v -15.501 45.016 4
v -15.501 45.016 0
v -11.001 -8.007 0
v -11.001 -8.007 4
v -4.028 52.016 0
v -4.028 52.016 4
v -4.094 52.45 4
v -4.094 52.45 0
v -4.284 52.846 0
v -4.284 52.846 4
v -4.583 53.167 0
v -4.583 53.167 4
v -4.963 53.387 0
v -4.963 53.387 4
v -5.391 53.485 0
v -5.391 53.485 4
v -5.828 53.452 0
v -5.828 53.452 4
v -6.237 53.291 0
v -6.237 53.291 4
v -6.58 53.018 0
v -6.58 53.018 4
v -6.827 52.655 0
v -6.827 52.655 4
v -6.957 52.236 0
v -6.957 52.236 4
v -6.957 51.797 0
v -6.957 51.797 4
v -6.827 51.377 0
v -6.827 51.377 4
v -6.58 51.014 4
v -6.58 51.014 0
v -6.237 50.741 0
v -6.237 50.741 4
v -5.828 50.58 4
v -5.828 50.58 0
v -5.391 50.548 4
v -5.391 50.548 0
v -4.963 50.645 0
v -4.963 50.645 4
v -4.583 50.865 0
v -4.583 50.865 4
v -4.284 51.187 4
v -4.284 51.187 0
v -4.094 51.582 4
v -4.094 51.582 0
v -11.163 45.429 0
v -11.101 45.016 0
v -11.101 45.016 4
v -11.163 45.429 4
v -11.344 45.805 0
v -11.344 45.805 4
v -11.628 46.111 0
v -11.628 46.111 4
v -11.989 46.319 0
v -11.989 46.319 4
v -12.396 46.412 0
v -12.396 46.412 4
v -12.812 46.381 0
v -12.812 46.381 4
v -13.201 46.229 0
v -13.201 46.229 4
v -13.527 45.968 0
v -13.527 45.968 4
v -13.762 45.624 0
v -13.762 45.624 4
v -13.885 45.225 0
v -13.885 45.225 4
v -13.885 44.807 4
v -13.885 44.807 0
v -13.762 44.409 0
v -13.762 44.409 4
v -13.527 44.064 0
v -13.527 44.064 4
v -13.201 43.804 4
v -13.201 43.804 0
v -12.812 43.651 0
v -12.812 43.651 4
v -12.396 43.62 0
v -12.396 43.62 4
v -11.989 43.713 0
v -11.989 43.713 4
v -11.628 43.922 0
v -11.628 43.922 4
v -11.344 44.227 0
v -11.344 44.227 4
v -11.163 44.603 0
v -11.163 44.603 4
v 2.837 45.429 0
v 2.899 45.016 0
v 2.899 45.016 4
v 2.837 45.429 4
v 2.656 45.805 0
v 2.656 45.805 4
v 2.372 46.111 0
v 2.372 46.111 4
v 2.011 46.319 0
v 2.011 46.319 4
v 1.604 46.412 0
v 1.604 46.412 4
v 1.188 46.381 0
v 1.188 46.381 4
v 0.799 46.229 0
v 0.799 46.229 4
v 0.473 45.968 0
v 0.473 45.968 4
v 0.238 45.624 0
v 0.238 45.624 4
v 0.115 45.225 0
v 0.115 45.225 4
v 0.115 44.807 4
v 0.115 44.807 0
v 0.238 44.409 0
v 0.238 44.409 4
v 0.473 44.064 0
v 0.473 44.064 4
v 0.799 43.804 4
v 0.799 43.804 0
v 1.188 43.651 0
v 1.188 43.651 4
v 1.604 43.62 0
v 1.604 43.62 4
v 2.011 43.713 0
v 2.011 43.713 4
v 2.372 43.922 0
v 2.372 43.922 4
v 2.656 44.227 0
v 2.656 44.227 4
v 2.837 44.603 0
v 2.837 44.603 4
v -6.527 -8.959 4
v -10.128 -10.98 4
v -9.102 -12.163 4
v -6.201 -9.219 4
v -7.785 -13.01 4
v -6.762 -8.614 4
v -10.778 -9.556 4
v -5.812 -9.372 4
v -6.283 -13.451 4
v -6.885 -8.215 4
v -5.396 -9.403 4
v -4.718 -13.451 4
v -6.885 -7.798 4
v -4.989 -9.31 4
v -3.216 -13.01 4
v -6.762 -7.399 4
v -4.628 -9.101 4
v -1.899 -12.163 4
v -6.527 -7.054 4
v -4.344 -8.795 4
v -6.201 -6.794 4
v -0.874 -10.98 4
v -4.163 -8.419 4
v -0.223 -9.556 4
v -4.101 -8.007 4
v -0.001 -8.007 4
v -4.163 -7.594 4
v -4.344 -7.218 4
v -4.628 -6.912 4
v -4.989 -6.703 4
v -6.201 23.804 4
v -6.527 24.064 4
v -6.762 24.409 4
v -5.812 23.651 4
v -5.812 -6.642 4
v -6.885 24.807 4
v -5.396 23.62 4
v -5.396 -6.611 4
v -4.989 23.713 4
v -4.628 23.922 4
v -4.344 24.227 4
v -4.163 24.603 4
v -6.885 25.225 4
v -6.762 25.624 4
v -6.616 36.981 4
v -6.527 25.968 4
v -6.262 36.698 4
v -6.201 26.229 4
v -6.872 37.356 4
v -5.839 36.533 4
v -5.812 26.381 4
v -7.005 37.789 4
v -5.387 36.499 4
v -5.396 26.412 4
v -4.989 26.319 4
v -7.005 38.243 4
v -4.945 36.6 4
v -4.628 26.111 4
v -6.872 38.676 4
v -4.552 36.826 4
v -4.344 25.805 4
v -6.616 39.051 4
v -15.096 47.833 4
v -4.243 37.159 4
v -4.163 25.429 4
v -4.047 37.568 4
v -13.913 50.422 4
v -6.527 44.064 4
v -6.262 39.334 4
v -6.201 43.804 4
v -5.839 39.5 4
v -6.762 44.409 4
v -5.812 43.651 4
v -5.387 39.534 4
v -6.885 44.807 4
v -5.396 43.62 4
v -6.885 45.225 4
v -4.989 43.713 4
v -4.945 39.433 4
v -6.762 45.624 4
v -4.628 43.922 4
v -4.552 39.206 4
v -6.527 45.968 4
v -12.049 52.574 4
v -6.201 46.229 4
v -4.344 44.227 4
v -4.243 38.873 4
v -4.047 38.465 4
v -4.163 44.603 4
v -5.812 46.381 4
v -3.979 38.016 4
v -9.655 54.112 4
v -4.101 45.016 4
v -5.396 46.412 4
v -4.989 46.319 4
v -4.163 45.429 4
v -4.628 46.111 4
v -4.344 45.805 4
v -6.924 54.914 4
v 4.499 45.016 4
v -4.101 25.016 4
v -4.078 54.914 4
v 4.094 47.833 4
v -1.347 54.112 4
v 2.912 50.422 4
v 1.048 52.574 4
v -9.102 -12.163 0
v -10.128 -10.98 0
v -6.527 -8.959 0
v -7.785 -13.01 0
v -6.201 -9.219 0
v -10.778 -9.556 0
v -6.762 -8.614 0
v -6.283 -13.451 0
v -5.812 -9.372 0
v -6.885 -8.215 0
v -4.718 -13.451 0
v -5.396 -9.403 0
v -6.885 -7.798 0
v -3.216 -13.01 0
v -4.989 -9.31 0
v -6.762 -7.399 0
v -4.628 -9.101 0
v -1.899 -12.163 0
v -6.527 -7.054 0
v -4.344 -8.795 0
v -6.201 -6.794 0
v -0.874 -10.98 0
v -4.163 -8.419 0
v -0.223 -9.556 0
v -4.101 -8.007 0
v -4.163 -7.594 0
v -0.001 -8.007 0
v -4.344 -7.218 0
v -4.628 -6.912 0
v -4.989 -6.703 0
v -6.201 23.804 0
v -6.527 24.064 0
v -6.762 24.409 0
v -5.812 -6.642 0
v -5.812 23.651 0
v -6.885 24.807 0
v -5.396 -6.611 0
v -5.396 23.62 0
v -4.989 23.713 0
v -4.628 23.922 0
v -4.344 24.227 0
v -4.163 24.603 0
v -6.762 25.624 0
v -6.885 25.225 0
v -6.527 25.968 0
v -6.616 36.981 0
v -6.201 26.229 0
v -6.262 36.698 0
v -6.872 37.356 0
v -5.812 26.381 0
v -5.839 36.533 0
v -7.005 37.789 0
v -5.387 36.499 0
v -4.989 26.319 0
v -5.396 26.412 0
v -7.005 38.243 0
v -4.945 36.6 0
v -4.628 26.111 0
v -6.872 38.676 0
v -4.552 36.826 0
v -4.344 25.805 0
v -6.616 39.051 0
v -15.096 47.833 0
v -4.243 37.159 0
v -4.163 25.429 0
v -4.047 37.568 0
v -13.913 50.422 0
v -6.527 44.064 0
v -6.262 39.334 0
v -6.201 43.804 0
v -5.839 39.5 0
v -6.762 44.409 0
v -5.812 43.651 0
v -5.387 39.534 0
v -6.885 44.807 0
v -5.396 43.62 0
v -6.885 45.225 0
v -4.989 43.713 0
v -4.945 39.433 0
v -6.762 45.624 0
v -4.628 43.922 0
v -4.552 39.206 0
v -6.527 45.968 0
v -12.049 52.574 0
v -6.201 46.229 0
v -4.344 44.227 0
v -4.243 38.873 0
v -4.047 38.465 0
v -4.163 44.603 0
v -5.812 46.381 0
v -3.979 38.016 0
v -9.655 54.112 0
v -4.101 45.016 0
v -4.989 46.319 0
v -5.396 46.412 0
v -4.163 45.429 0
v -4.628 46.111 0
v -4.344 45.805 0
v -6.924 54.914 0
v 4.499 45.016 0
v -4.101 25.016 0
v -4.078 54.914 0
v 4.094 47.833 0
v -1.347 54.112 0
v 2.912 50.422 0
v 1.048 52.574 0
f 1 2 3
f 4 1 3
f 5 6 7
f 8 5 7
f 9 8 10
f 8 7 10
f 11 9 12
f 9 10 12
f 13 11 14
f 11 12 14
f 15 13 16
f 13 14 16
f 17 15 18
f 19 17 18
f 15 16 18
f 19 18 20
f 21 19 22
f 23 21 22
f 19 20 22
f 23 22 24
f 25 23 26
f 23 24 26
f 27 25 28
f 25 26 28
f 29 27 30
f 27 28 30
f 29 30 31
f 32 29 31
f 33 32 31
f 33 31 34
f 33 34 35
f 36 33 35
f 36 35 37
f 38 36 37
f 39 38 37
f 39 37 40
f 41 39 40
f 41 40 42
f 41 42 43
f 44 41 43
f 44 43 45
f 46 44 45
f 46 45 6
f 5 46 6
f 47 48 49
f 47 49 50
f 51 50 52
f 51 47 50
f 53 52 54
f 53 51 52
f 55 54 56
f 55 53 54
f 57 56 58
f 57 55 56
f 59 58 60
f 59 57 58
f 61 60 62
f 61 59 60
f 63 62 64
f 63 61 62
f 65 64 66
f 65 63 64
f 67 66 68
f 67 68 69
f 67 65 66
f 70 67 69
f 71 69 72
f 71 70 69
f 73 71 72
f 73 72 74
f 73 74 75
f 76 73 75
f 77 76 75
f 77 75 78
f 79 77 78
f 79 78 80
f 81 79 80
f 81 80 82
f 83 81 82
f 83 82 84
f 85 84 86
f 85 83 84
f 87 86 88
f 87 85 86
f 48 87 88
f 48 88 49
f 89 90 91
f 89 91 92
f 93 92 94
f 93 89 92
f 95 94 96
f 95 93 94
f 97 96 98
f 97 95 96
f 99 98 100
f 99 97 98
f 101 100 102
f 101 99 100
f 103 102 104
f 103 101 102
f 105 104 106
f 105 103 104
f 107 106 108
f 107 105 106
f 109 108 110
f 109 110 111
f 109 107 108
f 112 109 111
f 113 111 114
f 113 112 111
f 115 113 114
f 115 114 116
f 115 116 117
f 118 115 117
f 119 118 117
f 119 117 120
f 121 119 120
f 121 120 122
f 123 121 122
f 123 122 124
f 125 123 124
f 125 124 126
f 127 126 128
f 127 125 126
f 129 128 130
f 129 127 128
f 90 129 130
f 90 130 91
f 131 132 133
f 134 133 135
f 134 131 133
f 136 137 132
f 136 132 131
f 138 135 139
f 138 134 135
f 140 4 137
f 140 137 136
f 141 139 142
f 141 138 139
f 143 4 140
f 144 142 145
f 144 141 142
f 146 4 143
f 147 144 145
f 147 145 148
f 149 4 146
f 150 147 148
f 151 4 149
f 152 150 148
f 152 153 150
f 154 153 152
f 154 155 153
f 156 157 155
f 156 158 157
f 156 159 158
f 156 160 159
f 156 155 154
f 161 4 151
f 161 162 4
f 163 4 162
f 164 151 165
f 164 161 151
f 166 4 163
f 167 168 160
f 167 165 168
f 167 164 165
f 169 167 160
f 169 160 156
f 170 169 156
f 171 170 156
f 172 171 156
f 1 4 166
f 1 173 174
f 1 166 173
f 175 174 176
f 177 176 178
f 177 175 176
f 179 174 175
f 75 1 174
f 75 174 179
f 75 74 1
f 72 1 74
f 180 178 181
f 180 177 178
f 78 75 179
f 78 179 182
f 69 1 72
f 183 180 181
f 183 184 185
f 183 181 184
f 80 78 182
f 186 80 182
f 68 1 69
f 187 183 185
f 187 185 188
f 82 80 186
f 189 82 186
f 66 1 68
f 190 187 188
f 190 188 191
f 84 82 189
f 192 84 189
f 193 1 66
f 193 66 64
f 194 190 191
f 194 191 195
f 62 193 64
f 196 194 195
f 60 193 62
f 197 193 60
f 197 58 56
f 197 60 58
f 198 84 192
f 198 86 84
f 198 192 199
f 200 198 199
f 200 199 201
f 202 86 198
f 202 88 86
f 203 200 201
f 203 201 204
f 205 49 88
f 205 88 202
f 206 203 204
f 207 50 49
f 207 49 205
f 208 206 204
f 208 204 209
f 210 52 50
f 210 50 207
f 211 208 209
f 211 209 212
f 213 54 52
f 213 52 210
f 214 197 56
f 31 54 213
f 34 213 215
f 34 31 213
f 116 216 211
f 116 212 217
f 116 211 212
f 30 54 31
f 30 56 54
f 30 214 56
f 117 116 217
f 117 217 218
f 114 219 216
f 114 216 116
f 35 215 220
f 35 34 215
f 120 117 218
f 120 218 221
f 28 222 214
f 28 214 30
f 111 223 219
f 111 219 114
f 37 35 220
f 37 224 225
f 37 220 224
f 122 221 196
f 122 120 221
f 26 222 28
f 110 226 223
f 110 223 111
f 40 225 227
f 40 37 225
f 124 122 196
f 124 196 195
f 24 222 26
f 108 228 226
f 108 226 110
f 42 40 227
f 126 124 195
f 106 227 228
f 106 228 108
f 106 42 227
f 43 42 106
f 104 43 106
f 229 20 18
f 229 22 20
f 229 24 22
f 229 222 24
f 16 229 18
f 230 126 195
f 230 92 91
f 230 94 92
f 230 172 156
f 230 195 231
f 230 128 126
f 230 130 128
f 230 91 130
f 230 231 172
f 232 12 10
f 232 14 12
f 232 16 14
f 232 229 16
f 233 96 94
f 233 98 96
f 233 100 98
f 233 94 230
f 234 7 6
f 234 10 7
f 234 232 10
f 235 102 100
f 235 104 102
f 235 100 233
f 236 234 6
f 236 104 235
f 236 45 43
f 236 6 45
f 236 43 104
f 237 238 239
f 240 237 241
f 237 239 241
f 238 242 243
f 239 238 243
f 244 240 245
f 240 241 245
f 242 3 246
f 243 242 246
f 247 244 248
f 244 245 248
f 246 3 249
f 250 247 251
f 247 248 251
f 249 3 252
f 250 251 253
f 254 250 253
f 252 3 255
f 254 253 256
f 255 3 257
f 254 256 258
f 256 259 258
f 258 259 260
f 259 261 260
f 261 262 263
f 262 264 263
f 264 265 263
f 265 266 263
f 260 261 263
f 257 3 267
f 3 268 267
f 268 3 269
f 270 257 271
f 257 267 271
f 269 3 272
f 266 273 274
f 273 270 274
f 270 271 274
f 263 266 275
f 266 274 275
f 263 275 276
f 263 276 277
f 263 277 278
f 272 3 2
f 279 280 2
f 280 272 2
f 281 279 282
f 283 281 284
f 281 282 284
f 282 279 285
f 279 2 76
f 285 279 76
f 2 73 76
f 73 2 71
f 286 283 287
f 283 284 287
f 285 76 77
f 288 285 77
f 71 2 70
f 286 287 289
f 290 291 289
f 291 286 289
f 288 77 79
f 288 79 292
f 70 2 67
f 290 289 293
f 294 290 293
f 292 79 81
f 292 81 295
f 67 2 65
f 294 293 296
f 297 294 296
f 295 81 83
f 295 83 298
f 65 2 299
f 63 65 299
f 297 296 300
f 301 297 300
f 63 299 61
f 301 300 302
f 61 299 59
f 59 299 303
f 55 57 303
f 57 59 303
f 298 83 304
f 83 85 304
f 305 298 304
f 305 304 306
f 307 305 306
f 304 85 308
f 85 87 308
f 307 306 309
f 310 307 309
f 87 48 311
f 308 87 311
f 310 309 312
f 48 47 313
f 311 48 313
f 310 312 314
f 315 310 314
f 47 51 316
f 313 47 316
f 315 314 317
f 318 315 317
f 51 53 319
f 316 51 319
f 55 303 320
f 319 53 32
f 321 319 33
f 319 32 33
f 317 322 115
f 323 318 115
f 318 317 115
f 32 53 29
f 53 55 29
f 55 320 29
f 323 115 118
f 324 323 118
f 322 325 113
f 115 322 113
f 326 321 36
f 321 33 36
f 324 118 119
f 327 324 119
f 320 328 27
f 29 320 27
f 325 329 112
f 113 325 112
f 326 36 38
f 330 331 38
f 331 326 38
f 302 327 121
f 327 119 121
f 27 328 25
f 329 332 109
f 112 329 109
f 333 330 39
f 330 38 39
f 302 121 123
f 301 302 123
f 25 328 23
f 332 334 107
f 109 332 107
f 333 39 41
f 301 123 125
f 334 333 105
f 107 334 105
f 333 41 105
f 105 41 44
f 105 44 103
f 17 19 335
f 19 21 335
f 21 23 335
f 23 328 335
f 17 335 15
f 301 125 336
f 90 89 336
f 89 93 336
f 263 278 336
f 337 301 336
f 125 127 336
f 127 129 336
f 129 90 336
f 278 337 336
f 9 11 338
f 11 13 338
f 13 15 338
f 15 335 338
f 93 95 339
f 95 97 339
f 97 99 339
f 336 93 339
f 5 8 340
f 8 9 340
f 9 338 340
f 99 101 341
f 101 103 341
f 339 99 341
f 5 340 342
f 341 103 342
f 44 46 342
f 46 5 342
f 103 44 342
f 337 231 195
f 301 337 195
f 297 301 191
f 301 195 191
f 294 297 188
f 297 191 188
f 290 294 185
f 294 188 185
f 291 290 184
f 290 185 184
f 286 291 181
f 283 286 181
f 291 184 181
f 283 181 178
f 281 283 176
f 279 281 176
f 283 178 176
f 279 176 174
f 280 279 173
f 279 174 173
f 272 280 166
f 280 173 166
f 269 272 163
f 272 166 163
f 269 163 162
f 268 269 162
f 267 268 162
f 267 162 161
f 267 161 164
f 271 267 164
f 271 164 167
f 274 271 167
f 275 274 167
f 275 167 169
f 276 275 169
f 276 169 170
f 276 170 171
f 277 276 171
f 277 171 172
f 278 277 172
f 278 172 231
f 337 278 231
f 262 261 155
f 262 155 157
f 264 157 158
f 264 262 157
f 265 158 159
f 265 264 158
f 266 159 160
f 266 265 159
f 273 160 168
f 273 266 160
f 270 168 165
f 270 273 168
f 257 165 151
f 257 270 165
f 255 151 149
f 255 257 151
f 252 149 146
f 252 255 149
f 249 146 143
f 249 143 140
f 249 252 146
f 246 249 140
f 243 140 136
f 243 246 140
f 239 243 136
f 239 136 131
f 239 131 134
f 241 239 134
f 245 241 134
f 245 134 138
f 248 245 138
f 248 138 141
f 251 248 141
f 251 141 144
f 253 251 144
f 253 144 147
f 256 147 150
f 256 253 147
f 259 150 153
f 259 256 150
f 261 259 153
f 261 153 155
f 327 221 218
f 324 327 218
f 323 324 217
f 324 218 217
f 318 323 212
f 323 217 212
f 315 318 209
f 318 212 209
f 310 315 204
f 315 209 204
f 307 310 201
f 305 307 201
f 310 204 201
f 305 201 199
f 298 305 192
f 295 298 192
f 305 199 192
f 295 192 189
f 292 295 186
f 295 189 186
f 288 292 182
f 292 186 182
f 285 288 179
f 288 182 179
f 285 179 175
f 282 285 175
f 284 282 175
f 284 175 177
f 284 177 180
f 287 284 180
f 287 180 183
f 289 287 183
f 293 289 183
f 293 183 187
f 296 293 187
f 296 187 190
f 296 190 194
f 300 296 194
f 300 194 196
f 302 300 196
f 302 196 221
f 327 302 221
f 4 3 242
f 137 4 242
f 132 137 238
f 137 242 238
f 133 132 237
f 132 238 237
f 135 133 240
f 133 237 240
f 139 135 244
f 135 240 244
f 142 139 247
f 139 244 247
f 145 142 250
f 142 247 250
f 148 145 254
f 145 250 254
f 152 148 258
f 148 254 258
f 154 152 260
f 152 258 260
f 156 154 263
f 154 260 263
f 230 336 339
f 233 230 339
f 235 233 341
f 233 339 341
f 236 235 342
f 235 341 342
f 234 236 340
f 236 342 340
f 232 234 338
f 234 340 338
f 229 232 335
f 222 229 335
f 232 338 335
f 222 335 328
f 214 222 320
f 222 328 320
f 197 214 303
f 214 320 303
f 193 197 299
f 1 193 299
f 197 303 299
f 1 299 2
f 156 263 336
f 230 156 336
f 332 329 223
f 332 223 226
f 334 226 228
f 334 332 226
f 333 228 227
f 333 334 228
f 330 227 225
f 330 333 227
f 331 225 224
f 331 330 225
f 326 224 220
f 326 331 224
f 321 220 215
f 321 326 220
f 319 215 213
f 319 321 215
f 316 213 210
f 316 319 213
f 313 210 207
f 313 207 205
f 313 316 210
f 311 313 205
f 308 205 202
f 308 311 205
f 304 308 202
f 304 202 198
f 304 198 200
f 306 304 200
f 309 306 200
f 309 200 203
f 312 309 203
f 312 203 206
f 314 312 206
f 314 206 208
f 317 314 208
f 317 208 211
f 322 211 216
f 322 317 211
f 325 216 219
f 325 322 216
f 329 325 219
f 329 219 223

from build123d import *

# Parameters (mm, degrees)
SKETCH1_R           = 1.4
BOSS_EXTRUDE1_DEPTH = 4
SKETCH2_R           = 1.521670414
SKETCH2_R_2         = 1.472584271
CUT_EXTRUDE1_DEPTH  = 10
SKETCH3_R           = 1.4
CUT_EXTRUDE2_DEPTH  = 10


with BuildPart() as part:
    # Sketch1 → Boss-Extrude1 (new body)
    with BuildSketch(Plane.XY):
        with BuildLine():
            Line((-15.500688459, 45.016091721), (-11.000688459, -8.006682704))
            ThreePointArc((-11.000688459, -8.006682704), (-5.500688459, -13.506682704), (-0.000688459, -8.006682704))
            Line((-0.000688459, -8.006682704), (4.499311541, 45.016091721))
            ThreePointArc((4.499311541, 45.016091721), (-5.500688459, 55.016091721), (-15.500688459, 45.016091721))
        make_face()
        with Locations((-5.500688459, -8.006682704)):
            Circle(SKETCH1_R, mode=Mode.SUBTRACT)
        with Locations((-5.500688459, 45.016091721)):
            Circle(SKETCH1_R, mode=Mode.SUBTRACT)
        with Locations((1.499311541, 45.016091721)):
            Circle(SKETCH1_R, mode=Mode.SUBTRACT)
        with Locations((-12.500688459, 45.016091721)):
            Circle(SKETCH1_R, mode=Mode.SUBTRACT)
    extrude(amount=BOSS_EXTRUDE1_DEPTH)

    # Sketch2 → Cut-Extrude1 (cut)
    with BuildSketch(Plane.XY.offset(4)):
        with Locations((-5.500688459, 38.016091721)):
            Circle(SKETCH2_R)
        with Locations((-5.500688459, 52.016091721)):
            Circle(SKETCH2_R_2)
    extrude(amount=-CUT_EXTRUDE1_DEPTH, mode=Mode.SUBTRACT)

    # Sketch3 → Cut-Extrude2 (cut)
    with BuildSketch(Plane.XY.offset(4)):
        with Locations((-5.500688459, 25.016091721)):
            Circle(SKETCH3_R)
    extrude(amount=-CUT_EXTRUDE2_DEPTH, mode=Mode.SUBTRACT)


solid = part.part
